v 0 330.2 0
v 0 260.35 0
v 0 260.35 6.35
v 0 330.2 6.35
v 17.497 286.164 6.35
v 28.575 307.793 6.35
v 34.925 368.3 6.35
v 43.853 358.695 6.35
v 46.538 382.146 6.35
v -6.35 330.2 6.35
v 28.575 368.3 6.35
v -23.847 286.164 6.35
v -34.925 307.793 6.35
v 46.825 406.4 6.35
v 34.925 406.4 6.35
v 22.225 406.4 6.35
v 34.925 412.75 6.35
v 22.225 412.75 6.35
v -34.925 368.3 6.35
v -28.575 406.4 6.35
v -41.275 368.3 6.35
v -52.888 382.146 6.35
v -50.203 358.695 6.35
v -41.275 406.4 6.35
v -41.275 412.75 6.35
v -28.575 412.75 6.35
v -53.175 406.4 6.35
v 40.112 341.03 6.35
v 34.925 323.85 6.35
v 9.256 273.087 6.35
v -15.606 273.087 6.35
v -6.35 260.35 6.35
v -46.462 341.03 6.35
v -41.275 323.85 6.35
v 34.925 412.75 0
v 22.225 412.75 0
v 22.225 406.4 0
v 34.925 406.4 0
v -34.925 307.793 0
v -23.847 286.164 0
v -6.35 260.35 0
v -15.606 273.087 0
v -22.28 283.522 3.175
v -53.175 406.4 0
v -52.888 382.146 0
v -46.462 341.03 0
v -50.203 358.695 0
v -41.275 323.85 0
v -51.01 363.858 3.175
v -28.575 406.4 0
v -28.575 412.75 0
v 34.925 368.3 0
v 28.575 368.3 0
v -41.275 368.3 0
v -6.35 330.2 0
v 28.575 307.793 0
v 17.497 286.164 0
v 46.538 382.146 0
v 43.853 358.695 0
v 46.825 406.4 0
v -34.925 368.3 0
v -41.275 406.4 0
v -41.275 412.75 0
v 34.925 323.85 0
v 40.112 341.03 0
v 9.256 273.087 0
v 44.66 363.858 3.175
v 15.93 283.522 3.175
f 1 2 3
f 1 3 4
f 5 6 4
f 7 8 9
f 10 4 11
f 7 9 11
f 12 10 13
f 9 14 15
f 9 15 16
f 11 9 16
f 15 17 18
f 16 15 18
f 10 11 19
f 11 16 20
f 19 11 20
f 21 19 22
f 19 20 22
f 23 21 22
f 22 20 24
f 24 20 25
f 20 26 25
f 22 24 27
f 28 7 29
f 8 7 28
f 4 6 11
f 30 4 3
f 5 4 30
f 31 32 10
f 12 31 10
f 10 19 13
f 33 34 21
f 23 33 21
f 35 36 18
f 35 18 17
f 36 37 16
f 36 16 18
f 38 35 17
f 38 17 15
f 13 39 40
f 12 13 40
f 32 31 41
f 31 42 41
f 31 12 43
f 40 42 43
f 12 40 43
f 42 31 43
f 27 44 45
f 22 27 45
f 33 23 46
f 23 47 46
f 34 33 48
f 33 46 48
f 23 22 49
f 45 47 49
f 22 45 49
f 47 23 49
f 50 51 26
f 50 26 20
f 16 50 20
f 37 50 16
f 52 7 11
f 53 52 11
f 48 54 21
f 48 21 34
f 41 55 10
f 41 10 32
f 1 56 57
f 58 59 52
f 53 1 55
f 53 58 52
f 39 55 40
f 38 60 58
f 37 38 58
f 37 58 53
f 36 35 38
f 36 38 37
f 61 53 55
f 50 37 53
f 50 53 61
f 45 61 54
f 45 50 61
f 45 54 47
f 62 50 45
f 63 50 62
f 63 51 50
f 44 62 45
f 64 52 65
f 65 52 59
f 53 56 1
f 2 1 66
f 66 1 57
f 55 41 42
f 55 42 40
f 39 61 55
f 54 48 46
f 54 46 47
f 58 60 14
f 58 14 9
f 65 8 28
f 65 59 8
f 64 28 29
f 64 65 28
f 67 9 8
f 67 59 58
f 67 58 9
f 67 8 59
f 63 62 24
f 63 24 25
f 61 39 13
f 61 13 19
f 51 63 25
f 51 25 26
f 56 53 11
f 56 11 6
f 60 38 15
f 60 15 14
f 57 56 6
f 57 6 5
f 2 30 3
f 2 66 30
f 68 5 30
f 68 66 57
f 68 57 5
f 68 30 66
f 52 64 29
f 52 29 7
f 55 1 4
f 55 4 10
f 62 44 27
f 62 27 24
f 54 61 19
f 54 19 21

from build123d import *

# Parameters (mm, degrees)
BOSS_EXTRUDE1_DEPTH = 6.35


with BuildPart() as part:
    # Sketch1 → Boss-Extrude1 (new body)
    with BuildSketch(Plane.XY):
        with BuildLine():
            Line((-53.175, 406.4), (-41.275, 406.4))
            Line((-41.275, 406.4), (-41.275, 412.75))
            Line((-41.275, 412.75), (-28.575, 412.75))
            Line((-28.575, 412.75), (-28.575, 406.4))
            Line((-28.575, 406.4), (-6.35, 406.4))
            Line((-6.35, 406.4), (22.225, 406.4))
            Line((22.225, 406.4), (22.225, 412.75))
            Line((22.225, 412.75), (34.925, 412.75))
            Line((34.925, 412.75), (34.925, 406.4))
            Line((34.925, 406.4), (46.825, 406.4))
            add(Edge.make_bspline(
                [(46.825, 406.4), (48.444514788, 362.591265004), (34.925, 323.85)],
                knots=[0, 0, 0, 0.535068669, 0.535068669, 0.535068669], degree=2))
            Line((34.925, 323.85), (34.925, 368.3))
            Line((34.925, 368.3), (28.575, 368.3))
            Line((28.575, 368.3), (28.575, 307.792730185))
            add(Edge.make_bspline(
                [(28.575, 307.792730185), (17.572742264, 282.971699721), (0, 260.35)],
                knots=[0.647499935, 0.647499935, 0.647499935, 1, 1, 1], degree=2))
            Line((0, 260.35), (0, 330.2))
            Line((0, 330.2), (-6.35, 330.2))
            Line((-6.35, 330.2), (-6.35, 260.35))
            add(Edge.make_bspline(
                [(-34.925, 307.792730185), (-23.922742264, 282.971699721), (-6.35, 260.35)],
                knots=[0.647499935, 0.647499935, 0.647499935, 1, 1, 1], degree=2))
            Line((-34.925, 307.792730185), (-34.925, 368.3))
            Line((-34.925, 368.3), (-41.275, 368.3))
            Line((-41.275, 368.3), (-41.275, 323.85))
            add(Edge.make_bspline(
                [(-53.175, 406.4), (-54.794514788, 362.591265004), (-41.275, 323.85)],
                knots=[0, 0, 0, 0.535068669, 0.535068669, 0.535068669], degree=2))
        make_face()
    extrude(amount=BOSS_EXTRUDE1_DEPTH)


solid = part.part
